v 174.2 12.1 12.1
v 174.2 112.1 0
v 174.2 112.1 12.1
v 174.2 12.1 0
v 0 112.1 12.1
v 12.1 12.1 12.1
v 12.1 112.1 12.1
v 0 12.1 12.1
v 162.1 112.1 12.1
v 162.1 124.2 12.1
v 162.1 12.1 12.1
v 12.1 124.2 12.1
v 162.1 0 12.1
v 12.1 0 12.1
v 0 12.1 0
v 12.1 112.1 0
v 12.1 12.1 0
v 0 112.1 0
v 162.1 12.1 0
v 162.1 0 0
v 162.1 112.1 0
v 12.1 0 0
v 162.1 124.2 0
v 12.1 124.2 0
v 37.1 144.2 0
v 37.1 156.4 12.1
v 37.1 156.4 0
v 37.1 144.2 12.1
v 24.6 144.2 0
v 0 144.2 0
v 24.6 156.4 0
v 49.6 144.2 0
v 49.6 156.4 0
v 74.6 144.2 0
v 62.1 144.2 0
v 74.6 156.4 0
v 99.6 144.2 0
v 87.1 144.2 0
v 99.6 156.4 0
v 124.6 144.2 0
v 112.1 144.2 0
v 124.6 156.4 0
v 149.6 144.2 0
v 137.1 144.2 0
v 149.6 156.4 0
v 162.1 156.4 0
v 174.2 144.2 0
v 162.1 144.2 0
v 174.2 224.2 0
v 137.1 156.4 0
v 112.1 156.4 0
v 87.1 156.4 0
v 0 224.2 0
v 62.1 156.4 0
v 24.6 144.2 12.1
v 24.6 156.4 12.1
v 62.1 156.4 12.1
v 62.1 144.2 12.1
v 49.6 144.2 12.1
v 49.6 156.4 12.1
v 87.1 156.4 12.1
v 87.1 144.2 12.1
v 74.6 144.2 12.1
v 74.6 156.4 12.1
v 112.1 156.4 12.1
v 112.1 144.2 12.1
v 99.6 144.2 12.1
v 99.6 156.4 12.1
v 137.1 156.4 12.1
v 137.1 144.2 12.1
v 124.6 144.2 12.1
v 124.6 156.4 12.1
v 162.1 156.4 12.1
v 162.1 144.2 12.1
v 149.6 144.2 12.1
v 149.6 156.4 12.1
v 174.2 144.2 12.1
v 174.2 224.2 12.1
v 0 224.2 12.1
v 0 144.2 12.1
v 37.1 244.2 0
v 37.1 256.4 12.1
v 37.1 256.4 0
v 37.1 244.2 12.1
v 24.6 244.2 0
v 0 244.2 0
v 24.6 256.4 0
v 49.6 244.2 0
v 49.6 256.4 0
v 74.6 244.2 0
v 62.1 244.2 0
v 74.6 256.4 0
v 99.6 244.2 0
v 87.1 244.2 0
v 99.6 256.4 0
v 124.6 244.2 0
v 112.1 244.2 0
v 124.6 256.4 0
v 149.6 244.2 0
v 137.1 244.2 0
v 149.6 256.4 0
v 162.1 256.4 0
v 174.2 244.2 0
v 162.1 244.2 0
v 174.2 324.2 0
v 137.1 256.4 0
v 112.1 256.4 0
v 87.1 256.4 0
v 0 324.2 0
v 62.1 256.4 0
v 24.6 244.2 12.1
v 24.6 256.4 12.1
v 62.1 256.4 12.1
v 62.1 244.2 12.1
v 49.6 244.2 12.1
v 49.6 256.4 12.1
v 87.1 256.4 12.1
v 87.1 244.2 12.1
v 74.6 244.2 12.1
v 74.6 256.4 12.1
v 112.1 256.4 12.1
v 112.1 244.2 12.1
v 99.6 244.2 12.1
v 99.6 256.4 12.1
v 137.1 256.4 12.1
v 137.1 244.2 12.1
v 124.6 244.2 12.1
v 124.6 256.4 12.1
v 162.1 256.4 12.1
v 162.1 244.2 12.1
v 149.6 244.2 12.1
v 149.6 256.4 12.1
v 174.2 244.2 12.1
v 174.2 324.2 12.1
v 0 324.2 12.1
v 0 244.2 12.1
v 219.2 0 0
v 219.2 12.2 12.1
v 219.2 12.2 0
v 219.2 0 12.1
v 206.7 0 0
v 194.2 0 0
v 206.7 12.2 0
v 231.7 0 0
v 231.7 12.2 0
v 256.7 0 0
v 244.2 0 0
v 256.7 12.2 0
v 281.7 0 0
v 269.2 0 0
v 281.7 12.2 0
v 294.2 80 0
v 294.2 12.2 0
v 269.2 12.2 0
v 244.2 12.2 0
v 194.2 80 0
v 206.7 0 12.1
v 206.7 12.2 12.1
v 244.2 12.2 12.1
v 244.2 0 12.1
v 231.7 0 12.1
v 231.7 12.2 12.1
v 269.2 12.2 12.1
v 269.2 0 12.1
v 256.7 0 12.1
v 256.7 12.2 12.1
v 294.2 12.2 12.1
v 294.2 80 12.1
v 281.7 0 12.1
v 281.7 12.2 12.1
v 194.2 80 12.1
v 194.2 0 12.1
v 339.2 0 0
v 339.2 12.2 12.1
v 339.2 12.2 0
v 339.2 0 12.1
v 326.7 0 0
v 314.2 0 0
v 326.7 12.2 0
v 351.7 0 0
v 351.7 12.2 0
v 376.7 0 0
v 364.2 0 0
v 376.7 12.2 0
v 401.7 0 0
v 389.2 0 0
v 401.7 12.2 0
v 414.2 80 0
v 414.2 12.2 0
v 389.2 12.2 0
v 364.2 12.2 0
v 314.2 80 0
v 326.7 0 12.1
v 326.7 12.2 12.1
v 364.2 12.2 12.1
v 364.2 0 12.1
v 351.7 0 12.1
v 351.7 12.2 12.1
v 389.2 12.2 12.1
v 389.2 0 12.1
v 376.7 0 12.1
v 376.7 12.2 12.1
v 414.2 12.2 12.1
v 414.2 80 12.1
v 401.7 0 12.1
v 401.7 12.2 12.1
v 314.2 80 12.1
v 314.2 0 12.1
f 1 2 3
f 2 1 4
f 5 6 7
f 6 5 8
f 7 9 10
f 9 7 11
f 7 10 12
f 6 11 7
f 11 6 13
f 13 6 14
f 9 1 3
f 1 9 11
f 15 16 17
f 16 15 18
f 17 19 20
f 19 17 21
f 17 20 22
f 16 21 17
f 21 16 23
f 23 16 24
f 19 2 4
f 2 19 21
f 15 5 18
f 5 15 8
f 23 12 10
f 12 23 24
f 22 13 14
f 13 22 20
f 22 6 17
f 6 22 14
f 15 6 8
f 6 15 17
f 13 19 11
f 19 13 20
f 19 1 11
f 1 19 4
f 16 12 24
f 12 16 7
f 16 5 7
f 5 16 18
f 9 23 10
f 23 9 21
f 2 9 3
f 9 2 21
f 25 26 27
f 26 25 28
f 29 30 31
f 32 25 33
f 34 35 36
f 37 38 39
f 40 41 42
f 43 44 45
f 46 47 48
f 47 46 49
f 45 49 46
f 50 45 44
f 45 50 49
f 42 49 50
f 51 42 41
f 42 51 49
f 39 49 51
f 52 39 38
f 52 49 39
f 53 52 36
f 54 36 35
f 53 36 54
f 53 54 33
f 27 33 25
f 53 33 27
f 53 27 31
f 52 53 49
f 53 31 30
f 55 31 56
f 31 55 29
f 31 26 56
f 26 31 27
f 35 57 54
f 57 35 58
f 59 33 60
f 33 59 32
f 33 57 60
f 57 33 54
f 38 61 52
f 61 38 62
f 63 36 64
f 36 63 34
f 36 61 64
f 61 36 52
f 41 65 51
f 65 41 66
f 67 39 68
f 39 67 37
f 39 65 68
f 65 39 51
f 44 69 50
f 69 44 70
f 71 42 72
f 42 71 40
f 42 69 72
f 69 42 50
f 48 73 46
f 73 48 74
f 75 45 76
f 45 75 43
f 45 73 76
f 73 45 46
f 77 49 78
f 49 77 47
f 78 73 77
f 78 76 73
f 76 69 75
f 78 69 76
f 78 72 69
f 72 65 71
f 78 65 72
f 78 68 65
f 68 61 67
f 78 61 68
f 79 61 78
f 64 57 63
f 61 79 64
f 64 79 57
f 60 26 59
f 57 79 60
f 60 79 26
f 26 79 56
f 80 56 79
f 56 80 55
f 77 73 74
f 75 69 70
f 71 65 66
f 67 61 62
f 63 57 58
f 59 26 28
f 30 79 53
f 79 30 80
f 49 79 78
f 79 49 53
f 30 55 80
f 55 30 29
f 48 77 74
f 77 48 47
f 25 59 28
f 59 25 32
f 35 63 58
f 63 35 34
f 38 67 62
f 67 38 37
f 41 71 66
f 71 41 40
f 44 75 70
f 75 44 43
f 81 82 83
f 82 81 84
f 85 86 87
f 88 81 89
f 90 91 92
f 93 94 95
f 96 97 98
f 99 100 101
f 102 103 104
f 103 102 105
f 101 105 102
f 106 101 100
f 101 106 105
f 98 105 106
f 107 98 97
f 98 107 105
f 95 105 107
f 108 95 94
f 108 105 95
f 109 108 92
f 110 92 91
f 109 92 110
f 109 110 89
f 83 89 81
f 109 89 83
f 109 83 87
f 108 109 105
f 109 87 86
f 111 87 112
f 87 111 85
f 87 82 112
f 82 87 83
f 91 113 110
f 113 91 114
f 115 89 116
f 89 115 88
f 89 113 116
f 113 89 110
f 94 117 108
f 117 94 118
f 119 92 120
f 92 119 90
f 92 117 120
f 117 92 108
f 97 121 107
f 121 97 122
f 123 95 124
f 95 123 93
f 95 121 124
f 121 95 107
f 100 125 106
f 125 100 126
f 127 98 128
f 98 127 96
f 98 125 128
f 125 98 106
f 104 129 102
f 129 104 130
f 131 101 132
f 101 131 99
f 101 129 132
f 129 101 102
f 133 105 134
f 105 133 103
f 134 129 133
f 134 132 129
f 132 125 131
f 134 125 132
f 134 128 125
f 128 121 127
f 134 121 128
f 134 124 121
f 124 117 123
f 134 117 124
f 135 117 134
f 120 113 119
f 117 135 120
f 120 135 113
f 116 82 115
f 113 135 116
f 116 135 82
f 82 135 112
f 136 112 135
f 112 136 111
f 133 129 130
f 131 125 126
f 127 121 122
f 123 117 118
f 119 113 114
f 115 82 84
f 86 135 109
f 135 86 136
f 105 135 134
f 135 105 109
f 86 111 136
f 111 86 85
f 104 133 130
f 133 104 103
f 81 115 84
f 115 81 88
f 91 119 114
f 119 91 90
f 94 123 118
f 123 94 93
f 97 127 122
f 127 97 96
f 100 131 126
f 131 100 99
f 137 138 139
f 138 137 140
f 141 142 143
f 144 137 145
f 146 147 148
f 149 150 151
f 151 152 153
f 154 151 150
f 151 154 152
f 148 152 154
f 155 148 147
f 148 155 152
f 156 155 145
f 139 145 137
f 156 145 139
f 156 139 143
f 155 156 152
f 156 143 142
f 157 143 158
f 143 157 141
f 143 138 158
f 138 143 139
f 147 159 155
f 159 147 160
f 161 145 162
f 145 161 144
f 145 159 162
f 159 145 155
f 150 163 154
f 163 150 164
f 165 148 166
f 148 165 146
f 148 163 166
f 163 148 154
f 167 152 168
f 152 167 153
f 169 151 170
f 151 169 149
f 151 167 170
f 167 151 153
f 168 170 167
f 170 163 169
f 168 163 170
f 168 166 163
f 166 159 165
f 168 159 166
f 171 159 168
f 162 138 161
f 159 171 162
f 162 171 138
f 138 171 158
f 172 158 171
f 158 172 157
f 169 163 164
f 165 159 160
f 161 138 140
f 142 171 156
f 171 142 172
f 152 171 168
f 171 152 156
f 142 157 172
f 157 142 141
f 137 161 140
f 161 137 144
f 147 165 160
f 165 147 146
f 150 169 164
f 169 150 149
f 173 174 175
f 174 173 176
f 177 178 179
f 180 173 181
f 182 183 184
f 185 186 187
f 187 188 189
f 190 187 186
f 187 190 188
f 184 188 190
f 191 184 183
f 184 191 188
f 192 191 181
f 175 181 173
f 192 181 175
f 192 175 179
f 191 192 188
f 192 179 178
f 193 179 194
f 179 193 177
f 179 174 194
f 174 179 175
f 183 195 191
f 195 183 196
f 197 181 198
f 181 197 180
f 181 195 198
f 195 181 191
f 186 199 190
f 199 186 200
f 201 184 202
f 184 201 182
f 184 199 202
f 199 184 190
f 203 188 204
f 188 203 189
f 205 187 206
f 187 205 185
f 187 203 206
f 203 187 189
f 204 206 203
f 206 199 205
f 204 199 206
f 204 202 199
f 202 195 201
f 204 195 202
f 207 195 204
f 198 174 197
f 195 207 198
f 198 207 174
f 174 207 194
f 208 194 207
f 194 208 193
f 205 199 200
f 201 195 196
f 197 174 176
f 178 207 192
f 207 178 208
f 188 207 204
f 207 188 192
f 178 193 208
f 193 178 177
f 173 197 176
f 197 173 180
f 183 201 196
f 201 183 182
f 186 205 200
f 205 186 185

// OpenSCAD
// ============================================================
// CNC Flatpack Box — Finger Joint / Tab-Slot Design
// ============================================================
// Designed for plywood CNC routing. All pieces are flat.
// Parts: Bottom, Front/Back, Left/Right, optional Lid
// Output each panel as a separate piece for CNC cutting.

// ---- MATERIAL / MACHINE PARAMETERS ----
material_t = 12;     // Plywood thickness (mm) — 1/2" = 12.7mm
bit_dia    = 3.175;  // CNC end mill diameter (mm) — 1/8" = 3.175mm
kerf       = 0.1;    // Laser/router kerf adjust (mm)
dogbone    = true;   // Add dogbone reliefs for inside corners?

// ---- BOX DIMENSIONS (internal) ----
box_w = 150;   // Internal width (X)
box_d = 100;   // Internal depth (Y)
box_h = 80;    // Internal height (Z)

// ---- FINGER JOINT PARAMETERS ----
finger_w = 12;  // Width of each finger/tab (mm)

// ---- DERIVED ----
T = material_t + kerf;
DB = dogbone ? bit_dia/2 : 0;  // Dogbone radius

// ---- DOGBONE RELIEF ----
module dogbone_corner(r) {
    if (dogbone) {
        translate([r, r, -0.1]) cylinder(r=r, h=T + 0.2, $fn=16);
    }
}

// ---- FINGER JOINT EDGE (generates tabs/slots for one edge) ----
// len = edge length, male = true → tabs, false → slots
module finger_edge(len, male) {
    n = floor(len / finger_w);
    step = len / n;
    start = male ? 0 : 1;
    for (i = [start : 2 : n-1]) {
        translate([i * step, -0.1, 0])
            cube([step, T + 0.2, T + 0.2]);
    }
}

// ---- BOTTOM PANEL ----
module panel_bottom() {
    difference() {
        cube([box_w + T*2, box_d + T*2, T]);
        // Corner notches
        cube([T, T, T + 0.2]);
        translate([box_w + T, 0, 0]) cube([T, T, T + 0.2]);
        translate([0, box_d + T, 0]) cube([T, T, T + 0.2]);
        translate([box_w + T, box_d + T, 0]) cube([T, T, T + 0.2]);
    }
}

// ---- FRONT / BACK PANEL ----
module panel_front() {
    difference() {
        cube([box_w + T*2, box_h, T]);
        // Bottom finger slots
        translate([T, 0, 0]) finger_edge(box_w, false);
        // Side finger slots (vertical)
        // (simplified — full implementation would intersect side tabs)
    }
}

// ---- SIDE PANEL ----
module panel_side() {
    difference() {
        cube([box_d, box_h, T]);
        // Bottom slots
        finger_edge(box_d, false);
    }
}

// ---- LAYOUT (flat on build plate for CNC preview) ----
// Bottom
panel_bottom();
// Front (offset for viewing)
translate([0, box_d + T*2 + 20, 0]) panel_front();
// Back
translate([0, box_d + T*2 + box_h + 40, 0]) panel_front();
// Left side
translate([box_w + T*2 + 20, 0, 0]) panel_side();
// Right side
translate([box_w + T*2 + box_d + 40, 0, 0]) panel_side();
